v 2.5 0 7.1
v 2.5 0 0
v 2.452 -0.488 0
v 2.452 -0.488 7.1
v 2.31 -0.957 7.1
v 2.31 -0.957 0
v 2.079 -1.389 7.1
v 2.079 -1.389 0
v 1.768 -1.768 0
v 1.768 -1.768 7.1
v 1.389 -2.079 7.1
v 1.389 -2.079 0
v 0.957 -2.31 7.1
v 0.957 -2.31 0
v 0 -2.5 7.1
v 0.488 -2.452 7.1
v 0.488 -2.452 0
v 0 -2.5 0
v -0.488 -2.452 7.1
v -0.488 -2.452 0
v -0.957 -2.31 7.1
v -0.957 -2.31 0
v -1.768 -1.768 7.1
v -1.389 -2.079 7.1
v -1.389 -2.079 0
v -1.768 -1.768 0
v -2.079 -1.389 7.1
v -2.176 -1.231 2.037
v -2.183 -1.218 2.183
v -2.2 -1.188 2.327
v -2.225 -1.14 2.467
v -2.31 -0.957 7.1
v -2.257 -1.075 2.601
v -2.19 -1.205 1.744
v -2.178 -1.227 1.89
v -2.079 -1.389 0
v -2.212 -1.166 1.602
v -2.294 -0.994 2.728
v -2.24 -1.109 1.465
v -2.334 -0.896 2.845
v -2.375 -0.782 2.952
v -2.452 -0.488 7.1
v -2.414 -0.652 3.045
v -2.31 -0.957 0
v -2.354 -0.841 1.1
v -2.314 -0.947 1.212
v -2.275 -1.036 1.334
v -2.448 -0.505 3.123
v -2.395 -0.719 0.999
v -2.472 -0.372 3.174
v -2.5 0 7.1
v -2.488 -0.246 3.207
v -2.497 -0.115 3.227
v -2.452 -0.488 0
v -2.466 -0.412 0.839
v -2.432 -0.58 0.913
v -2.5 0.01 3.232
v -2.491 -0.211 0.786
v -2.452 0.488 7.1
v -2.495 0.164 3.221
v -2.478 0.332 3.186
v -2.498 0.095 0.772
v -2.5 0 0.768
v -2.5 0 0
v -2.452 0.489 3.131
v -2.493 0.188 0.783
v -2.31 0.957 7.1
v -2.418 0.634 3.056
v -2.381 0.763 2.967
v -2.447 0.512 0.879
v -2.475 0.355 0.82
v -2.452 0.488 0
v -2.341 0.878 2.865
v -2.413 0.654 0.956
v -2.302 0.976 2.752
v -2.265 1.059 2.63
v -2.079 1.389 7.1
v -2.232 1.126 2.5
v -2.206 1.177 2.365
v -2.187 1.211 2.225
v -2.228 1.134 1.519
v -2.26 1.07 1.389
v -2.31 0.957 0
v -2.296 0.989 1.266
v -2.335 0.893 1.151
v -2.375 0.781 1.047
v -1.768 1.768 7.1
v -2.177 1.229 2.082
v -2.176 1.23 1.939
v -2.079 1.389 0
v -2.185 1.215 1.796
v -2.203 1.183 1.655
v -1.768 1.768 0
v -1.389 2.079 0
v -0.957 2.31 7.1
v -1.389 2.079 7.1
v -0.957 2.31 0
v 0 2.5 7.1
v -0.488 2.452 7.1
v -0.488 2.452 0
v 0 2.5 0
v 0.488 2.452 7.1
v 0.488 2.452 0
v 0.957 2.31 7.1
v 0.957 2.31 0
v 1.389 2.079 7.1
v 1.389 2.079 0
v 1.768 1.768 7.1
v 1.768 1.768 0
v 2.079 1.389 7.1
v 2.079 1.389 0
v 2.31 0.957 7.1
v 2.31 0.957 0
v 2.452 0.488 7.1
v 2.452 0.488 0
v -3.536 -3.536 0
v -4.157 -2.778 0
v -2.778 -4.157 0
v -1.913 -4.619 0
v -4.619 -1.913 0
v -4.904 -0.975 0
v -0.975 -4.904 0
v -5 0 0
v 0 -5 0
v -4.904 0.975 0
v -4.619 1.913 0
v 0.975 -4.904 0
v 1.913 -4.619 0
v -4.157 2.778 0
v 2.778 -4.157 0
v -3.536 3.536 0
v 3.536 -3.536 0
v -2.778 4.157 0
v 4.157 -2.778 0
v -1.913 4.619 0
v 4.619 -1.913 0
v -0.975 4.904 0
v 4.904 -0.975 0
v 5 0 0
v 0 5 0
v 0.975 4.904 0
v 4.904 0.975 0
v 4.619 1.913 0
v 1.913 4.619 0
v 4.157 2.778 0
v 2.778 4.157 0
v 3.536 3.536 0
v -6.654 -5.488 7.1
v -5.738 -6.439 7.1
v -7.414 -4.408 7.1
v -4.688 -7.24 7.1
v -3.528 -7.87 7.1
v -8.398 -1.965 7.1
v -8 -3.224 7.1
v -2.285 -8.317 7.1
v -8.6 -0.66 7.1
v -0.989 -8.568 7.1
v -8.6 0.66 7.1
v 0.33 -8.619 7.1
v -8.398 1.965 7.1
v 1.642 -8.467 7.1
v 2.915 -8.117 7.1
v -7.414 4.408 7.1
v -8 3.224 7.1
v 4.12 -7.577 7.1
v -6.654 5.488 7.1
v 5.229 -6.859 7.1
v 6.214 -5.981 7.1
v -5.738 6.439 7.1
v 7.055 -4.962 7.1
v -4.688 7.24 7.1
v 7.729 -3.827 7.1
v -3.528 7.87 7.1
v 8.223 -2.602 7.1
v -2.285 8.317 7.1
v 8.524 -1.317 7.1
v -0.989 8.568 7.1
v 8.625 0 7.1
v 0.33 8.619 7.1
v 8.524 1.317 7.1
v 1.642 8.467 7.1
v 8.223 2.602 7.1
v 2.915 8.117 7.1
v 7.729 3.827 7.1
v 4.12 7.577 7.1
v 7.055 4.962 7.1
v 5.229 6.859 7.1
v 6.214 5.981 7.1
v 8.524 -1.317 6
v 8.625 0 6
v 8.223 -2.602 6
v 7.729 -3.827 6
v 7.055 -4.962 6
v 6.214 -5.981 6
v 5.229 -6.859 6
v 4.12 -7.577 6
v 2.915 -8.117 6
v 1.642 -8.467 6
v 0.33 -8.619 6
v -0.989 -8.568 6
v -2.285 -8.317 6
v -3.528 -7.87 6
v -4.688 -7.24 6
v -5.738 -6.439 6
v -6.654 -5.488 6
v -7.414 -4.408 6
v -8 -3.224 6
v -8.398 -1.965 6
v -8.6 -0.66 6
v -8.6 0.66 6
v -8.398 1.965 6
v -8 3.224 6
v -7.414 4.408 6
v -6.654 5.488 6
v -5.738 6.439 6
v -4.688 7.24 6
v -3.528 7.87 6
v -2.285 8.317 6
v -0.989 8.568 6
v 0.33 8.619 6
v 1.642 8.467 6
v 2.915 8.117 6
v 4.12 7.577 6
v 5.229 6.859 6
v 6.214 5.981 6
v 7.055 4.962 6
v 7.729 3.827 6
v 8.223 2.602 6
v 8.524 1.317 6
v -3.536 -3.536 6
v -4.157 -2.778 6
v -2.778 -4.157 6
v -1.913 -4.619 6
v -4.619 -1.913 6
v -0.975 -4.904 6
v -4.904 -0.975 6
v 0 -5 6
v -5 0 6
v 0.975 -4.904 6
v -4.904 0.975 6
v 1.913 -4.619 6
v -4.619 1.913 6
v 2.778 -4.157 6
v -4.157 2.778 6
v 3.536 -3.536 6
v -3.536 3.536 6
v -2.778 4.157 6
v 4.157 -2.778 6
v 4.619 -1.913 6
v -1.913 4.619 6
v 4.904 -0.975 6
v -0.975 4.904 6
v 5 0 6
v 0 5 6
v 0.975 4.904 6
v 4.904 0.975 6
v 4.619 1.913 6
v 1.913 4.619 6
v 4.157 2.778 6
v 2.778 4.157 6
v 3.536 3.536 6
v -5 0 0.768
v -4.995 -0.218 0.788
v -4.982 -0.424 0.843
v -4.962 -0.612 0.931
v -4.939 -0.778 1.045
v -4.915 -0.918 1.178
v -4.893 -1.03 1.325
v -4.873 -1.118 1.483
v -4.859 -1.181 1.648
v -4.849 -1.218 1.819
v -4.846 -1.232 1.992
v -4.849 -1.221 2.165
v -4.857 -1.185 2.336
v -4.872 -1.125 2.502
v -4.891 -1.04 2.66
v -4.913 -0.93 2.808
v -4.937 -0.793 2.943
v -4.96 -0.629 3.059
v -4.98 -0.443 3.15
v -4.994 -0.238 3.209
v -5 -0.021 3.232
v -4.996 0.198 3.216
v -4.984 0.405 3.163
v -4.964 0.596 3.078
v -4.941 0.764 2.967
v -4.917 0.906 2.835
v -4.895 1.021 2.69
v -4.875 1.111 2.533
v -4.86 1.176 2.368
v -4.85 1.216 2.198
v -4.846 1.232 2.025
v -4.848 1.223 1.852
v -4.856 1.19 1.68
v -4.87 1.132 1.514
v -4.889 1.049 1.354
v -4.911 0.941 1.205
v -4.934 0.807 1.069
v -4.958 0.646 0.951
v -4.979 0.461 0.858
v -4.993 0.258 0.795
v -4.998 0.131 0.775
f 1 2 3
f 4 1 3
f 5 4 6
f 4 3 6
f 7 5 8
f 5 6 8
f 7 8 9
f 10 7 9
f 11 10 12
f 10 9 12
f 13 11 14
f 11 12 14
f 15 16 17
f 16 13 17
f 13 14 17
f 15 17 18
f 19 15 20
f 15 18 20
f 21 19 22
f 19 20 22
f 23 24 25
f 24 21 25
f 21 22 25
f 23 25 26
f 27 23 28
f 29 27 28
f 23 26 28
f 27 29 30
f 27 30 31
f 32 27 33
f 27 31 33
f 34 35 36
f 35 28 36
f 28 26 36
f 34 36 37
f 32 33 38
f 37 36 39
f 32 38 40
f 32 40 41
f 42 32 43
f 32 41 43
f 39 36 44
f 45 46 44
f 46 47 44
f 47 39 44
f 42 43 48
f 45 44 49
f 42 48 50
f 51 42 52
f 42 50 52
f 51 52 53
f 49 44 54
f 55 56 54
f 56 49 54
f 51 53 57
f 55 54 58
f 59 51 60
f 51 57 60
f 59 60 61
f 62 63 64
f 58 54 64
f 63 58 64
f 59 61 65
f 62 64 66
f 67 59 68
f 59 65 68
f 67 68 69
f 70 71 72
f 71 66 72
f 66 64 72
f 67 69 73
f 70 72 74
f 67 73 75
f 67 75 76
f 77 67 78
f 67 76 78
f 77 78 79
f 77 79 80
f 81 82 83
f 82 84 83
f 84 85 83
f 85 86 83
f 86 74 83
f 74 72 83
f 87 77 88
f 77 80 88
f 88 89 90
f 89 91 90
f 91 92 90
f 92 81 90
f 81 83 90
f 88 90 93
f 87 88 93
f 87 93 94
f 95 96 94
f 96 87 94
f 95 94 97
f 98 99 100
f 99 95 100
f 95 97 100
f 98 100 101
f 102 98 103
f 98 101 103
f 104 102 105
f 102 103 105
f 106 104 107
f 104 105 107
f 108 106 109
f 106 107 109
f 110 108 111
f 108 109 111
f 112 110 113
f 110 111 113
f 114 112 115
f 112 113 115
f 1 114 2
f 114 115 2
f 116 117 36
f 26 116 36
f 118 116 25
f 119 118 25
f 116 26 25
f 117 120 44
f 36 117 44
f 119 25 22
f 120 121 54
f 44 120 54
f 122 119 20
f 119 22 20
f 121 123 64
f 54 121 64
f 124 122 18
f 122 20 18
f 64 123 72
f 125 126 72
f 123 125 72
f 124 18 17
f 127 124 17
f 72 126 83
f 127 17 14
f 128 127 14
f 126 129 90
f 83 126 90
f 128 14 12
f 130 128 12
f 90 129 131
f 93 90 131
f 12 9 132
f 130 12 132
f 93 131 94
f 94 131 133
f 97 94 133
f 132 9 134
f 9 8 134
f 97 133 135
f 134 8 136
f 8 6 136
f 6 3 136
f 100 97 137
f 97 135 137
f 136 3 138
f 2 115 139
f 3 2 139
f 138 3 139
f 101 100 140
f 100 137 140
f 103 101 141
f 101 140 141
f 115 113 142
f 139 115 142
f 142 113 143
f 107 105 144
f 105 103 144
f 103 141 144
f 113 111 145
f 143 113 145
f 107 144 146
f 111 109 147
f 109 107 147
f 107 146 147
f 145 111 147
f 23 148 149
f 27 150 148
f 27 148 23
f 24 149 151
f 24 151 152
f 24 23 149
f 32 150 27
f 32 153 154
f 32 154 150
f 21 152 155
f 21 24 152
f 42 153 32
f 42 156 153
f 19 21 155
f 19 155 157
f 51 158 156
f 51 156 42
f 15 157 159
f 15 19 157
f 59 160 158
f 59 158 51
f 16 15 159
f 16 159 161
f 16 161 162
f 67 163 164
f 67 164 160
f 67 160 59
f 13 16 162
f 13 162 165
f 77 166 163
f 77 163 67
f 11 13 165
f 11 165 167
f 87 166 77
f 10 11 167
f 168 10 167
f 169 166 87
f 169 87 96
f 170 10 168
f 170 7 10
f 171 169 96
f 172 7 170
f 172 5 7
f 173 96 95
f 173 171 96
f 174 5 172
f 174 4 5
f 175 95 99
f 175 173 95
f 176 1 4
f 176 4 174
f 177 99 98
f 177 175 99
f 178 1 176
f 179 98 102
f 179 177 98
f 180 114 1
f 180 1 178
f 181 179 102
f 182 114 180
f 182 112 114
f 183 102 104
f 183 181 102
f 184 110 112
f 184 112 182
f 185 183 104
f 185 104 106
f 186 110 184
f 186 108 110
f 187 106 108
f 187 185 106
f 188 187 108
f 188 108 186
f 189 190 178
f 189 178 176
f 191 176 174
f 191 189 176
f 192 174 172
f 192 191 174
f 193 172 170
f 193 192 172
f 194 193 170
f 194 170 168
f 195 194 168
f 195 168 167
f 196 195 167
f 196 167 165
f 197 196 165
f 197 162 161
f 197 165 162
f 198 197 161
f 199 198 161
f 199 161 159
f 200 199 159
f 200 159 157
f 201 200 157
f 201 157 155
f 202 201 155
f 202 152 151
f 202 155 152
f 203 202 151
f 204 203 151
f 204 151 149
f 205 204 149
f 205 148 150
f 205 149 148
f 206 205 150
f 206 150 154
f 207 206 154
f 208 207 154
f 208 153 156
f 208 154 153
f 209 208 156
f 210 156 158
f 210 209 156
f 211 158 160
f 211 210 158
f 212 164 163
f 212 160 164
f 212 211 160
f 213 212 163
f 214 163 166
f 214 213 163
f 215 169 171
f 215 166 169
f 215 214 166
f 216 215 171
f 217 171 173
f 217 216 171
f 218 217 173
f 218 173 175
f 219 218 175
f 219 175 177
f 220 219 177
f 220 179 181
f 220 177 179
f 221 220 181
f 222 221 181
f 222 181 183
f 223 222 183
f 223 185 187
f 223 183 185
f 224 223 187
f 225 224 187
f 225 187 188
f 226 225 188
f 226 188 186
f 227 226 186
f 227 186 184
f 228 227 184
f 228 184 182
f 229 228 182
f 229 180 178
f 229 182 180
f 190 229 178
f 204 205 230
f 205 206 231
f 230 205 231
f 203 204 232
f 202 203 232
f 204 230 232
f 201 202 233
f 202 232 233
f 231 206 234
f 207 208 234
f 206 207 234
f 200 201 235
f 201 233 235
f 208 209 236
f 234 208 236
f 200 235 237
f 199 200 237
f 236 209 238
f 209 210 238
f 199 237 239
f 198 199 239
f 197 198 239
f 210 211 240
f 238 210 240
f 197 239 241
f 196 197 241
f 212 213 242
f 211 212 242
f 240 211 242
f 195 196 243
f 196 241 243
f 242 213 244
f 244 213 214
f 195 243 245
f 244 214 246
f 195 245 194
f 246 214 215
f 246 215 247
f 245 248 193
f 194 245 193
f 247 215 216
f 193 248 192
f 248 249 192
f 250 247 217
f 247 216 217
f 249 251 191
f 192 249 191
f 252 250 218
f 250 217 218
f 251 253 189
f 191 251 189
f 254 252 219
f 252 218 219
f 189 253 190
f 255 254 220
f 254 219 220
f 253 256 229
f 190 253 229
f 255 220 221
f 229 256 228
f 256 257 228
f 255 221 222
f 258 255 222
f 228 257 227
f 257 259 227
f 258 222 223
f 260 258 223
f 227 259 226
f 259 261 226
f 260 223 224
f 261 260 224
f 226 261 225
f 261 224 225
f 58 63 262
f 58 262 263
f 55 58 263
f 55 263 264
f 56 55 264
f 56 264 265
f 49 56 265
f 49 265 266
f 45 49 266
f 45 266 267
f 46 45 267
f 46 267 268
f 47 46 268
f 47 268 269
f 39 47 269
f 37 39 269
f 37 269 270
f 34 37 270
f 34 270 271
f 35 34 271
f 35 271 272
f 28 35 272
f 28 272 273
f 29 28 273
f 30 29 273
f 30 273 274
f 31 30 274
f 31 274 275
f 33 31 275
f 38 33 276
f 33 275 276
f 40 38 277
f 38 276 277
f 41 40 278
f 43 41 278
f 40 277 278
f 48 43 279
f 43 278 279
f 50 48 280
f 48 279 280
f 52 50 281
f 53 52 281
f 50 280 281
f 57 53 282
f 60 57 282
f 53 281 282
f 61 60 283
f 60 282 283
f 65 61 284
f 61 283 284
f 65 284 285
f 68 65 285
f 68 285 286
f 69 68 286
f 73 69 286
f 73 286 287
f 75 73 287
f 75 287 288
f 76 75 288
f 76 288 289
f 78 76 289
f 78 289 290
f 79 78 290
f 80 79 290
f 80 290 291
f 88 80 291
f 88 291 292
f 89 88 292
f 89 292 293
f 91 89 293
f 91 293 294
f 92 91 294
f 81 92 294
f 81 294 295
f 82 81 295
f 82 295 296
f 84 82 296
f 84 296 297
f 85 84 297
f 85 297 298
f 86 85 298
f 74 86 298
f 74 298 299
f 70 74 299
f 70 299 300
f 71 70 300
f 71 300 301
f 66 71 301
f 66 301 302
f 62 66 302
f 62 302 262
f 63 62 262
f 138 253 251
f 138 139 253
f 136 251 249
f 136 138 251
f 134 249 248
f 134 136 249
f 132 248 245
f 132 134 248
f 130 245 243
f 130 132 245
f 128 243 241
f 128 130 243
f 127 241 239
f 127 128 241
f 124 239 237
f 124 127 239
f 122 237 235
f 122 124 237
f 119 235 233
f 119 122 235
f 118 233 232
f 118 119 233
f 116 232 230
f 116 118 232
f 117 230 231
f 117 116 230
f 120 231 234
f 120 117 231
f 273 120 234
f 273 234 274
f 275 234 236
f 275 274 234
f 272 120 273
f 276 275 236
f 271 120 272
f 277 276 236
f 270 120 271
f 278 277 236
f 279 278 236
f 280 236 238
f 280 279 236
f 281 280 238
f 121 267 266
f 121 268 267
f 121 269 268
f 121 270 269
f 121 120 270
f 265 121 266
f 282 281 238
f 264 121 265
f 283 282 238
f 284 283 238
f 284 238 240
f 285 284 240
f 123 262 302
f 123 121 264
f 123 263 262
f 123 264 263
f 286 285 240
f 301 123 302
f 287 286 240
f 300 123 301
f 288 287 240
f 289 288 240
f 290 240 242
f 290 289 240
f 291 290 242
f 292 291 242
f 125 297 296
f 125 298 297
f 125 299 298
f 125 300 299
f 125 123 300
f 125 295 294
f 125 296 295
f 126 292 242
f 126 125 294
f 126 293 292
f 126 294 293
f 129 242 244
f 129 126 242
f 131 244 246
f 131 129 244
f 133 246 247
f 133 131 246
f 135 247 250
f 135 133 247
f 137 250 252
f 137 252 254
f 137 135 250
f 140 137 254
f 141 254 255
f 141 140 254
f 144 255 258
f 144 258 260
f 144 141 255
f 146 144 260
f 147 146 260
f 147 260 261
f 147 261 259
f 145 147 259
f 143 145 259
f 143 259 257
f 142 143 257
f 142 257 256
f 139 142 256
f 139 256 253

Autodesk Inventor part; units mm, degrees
ref_plane "YZ Plane" through (0, 0, 0) normal (1, 0, 0) x (0, 1, 0)
ref_plane "XZ Plane" through (0, 0, 0) normal (0, 1, 0) x (-1, 0, 0)
ref_plane "XY Plane" through (0, 0, 0) normal (0, 0, 1) x (1, 0, 0)
sketch "Sketch1" plane through (0, 0, 0) normal (0, 0, 1) x (1, 0, 0)
  line L0 (0, 7) -> (0, -7) projected
  line L1 (-7, 0) -> (7, 0) projected
  circle A0 centre (0, 0) radius 5
  circle A1 centre (0, 0) radius 2.5
  dimension "d0" = 10
  dimension "d1" = 5
extrude "Extrusion1" add sketch "Sketch1" along normal blind 6 contours A0 L1 A1 L0 | L0 A1 L1 A0 | A0 L0 A1 L1 | L1 A1 L0 A0
sketch "Sketch2" plane through (0, 0, 6) normal (0, 0, 1) x (1, 0, 0)
  circle A0 centre (0, 0) radius 2.5 projected
  circle A1 centre (0, 0) radius 5 projected
  circle A2 centre (0, 0) radius 8.625
  dimension "d4" = 17.25
extrude "Extrusion2" add sketch "Sketch2" along normal blind 1.1 contours A1 | A2
sketch "Sketch3" plane through (0, 0, 0) normal (1, 0, 0) x (0, 1, 0)
  line L0 (0, 8.52) -> (0, -1.42) projected
  line L1 (-12.075, 0) -> (12.075, 0) projected
  point P0 (0, 0)
  point P1 (0, 2)
  dimension "d7" = 2
hole "Hole1" at (0, 0, 2) direction (-1, 0, 0) diameter 2.4638 end through all
